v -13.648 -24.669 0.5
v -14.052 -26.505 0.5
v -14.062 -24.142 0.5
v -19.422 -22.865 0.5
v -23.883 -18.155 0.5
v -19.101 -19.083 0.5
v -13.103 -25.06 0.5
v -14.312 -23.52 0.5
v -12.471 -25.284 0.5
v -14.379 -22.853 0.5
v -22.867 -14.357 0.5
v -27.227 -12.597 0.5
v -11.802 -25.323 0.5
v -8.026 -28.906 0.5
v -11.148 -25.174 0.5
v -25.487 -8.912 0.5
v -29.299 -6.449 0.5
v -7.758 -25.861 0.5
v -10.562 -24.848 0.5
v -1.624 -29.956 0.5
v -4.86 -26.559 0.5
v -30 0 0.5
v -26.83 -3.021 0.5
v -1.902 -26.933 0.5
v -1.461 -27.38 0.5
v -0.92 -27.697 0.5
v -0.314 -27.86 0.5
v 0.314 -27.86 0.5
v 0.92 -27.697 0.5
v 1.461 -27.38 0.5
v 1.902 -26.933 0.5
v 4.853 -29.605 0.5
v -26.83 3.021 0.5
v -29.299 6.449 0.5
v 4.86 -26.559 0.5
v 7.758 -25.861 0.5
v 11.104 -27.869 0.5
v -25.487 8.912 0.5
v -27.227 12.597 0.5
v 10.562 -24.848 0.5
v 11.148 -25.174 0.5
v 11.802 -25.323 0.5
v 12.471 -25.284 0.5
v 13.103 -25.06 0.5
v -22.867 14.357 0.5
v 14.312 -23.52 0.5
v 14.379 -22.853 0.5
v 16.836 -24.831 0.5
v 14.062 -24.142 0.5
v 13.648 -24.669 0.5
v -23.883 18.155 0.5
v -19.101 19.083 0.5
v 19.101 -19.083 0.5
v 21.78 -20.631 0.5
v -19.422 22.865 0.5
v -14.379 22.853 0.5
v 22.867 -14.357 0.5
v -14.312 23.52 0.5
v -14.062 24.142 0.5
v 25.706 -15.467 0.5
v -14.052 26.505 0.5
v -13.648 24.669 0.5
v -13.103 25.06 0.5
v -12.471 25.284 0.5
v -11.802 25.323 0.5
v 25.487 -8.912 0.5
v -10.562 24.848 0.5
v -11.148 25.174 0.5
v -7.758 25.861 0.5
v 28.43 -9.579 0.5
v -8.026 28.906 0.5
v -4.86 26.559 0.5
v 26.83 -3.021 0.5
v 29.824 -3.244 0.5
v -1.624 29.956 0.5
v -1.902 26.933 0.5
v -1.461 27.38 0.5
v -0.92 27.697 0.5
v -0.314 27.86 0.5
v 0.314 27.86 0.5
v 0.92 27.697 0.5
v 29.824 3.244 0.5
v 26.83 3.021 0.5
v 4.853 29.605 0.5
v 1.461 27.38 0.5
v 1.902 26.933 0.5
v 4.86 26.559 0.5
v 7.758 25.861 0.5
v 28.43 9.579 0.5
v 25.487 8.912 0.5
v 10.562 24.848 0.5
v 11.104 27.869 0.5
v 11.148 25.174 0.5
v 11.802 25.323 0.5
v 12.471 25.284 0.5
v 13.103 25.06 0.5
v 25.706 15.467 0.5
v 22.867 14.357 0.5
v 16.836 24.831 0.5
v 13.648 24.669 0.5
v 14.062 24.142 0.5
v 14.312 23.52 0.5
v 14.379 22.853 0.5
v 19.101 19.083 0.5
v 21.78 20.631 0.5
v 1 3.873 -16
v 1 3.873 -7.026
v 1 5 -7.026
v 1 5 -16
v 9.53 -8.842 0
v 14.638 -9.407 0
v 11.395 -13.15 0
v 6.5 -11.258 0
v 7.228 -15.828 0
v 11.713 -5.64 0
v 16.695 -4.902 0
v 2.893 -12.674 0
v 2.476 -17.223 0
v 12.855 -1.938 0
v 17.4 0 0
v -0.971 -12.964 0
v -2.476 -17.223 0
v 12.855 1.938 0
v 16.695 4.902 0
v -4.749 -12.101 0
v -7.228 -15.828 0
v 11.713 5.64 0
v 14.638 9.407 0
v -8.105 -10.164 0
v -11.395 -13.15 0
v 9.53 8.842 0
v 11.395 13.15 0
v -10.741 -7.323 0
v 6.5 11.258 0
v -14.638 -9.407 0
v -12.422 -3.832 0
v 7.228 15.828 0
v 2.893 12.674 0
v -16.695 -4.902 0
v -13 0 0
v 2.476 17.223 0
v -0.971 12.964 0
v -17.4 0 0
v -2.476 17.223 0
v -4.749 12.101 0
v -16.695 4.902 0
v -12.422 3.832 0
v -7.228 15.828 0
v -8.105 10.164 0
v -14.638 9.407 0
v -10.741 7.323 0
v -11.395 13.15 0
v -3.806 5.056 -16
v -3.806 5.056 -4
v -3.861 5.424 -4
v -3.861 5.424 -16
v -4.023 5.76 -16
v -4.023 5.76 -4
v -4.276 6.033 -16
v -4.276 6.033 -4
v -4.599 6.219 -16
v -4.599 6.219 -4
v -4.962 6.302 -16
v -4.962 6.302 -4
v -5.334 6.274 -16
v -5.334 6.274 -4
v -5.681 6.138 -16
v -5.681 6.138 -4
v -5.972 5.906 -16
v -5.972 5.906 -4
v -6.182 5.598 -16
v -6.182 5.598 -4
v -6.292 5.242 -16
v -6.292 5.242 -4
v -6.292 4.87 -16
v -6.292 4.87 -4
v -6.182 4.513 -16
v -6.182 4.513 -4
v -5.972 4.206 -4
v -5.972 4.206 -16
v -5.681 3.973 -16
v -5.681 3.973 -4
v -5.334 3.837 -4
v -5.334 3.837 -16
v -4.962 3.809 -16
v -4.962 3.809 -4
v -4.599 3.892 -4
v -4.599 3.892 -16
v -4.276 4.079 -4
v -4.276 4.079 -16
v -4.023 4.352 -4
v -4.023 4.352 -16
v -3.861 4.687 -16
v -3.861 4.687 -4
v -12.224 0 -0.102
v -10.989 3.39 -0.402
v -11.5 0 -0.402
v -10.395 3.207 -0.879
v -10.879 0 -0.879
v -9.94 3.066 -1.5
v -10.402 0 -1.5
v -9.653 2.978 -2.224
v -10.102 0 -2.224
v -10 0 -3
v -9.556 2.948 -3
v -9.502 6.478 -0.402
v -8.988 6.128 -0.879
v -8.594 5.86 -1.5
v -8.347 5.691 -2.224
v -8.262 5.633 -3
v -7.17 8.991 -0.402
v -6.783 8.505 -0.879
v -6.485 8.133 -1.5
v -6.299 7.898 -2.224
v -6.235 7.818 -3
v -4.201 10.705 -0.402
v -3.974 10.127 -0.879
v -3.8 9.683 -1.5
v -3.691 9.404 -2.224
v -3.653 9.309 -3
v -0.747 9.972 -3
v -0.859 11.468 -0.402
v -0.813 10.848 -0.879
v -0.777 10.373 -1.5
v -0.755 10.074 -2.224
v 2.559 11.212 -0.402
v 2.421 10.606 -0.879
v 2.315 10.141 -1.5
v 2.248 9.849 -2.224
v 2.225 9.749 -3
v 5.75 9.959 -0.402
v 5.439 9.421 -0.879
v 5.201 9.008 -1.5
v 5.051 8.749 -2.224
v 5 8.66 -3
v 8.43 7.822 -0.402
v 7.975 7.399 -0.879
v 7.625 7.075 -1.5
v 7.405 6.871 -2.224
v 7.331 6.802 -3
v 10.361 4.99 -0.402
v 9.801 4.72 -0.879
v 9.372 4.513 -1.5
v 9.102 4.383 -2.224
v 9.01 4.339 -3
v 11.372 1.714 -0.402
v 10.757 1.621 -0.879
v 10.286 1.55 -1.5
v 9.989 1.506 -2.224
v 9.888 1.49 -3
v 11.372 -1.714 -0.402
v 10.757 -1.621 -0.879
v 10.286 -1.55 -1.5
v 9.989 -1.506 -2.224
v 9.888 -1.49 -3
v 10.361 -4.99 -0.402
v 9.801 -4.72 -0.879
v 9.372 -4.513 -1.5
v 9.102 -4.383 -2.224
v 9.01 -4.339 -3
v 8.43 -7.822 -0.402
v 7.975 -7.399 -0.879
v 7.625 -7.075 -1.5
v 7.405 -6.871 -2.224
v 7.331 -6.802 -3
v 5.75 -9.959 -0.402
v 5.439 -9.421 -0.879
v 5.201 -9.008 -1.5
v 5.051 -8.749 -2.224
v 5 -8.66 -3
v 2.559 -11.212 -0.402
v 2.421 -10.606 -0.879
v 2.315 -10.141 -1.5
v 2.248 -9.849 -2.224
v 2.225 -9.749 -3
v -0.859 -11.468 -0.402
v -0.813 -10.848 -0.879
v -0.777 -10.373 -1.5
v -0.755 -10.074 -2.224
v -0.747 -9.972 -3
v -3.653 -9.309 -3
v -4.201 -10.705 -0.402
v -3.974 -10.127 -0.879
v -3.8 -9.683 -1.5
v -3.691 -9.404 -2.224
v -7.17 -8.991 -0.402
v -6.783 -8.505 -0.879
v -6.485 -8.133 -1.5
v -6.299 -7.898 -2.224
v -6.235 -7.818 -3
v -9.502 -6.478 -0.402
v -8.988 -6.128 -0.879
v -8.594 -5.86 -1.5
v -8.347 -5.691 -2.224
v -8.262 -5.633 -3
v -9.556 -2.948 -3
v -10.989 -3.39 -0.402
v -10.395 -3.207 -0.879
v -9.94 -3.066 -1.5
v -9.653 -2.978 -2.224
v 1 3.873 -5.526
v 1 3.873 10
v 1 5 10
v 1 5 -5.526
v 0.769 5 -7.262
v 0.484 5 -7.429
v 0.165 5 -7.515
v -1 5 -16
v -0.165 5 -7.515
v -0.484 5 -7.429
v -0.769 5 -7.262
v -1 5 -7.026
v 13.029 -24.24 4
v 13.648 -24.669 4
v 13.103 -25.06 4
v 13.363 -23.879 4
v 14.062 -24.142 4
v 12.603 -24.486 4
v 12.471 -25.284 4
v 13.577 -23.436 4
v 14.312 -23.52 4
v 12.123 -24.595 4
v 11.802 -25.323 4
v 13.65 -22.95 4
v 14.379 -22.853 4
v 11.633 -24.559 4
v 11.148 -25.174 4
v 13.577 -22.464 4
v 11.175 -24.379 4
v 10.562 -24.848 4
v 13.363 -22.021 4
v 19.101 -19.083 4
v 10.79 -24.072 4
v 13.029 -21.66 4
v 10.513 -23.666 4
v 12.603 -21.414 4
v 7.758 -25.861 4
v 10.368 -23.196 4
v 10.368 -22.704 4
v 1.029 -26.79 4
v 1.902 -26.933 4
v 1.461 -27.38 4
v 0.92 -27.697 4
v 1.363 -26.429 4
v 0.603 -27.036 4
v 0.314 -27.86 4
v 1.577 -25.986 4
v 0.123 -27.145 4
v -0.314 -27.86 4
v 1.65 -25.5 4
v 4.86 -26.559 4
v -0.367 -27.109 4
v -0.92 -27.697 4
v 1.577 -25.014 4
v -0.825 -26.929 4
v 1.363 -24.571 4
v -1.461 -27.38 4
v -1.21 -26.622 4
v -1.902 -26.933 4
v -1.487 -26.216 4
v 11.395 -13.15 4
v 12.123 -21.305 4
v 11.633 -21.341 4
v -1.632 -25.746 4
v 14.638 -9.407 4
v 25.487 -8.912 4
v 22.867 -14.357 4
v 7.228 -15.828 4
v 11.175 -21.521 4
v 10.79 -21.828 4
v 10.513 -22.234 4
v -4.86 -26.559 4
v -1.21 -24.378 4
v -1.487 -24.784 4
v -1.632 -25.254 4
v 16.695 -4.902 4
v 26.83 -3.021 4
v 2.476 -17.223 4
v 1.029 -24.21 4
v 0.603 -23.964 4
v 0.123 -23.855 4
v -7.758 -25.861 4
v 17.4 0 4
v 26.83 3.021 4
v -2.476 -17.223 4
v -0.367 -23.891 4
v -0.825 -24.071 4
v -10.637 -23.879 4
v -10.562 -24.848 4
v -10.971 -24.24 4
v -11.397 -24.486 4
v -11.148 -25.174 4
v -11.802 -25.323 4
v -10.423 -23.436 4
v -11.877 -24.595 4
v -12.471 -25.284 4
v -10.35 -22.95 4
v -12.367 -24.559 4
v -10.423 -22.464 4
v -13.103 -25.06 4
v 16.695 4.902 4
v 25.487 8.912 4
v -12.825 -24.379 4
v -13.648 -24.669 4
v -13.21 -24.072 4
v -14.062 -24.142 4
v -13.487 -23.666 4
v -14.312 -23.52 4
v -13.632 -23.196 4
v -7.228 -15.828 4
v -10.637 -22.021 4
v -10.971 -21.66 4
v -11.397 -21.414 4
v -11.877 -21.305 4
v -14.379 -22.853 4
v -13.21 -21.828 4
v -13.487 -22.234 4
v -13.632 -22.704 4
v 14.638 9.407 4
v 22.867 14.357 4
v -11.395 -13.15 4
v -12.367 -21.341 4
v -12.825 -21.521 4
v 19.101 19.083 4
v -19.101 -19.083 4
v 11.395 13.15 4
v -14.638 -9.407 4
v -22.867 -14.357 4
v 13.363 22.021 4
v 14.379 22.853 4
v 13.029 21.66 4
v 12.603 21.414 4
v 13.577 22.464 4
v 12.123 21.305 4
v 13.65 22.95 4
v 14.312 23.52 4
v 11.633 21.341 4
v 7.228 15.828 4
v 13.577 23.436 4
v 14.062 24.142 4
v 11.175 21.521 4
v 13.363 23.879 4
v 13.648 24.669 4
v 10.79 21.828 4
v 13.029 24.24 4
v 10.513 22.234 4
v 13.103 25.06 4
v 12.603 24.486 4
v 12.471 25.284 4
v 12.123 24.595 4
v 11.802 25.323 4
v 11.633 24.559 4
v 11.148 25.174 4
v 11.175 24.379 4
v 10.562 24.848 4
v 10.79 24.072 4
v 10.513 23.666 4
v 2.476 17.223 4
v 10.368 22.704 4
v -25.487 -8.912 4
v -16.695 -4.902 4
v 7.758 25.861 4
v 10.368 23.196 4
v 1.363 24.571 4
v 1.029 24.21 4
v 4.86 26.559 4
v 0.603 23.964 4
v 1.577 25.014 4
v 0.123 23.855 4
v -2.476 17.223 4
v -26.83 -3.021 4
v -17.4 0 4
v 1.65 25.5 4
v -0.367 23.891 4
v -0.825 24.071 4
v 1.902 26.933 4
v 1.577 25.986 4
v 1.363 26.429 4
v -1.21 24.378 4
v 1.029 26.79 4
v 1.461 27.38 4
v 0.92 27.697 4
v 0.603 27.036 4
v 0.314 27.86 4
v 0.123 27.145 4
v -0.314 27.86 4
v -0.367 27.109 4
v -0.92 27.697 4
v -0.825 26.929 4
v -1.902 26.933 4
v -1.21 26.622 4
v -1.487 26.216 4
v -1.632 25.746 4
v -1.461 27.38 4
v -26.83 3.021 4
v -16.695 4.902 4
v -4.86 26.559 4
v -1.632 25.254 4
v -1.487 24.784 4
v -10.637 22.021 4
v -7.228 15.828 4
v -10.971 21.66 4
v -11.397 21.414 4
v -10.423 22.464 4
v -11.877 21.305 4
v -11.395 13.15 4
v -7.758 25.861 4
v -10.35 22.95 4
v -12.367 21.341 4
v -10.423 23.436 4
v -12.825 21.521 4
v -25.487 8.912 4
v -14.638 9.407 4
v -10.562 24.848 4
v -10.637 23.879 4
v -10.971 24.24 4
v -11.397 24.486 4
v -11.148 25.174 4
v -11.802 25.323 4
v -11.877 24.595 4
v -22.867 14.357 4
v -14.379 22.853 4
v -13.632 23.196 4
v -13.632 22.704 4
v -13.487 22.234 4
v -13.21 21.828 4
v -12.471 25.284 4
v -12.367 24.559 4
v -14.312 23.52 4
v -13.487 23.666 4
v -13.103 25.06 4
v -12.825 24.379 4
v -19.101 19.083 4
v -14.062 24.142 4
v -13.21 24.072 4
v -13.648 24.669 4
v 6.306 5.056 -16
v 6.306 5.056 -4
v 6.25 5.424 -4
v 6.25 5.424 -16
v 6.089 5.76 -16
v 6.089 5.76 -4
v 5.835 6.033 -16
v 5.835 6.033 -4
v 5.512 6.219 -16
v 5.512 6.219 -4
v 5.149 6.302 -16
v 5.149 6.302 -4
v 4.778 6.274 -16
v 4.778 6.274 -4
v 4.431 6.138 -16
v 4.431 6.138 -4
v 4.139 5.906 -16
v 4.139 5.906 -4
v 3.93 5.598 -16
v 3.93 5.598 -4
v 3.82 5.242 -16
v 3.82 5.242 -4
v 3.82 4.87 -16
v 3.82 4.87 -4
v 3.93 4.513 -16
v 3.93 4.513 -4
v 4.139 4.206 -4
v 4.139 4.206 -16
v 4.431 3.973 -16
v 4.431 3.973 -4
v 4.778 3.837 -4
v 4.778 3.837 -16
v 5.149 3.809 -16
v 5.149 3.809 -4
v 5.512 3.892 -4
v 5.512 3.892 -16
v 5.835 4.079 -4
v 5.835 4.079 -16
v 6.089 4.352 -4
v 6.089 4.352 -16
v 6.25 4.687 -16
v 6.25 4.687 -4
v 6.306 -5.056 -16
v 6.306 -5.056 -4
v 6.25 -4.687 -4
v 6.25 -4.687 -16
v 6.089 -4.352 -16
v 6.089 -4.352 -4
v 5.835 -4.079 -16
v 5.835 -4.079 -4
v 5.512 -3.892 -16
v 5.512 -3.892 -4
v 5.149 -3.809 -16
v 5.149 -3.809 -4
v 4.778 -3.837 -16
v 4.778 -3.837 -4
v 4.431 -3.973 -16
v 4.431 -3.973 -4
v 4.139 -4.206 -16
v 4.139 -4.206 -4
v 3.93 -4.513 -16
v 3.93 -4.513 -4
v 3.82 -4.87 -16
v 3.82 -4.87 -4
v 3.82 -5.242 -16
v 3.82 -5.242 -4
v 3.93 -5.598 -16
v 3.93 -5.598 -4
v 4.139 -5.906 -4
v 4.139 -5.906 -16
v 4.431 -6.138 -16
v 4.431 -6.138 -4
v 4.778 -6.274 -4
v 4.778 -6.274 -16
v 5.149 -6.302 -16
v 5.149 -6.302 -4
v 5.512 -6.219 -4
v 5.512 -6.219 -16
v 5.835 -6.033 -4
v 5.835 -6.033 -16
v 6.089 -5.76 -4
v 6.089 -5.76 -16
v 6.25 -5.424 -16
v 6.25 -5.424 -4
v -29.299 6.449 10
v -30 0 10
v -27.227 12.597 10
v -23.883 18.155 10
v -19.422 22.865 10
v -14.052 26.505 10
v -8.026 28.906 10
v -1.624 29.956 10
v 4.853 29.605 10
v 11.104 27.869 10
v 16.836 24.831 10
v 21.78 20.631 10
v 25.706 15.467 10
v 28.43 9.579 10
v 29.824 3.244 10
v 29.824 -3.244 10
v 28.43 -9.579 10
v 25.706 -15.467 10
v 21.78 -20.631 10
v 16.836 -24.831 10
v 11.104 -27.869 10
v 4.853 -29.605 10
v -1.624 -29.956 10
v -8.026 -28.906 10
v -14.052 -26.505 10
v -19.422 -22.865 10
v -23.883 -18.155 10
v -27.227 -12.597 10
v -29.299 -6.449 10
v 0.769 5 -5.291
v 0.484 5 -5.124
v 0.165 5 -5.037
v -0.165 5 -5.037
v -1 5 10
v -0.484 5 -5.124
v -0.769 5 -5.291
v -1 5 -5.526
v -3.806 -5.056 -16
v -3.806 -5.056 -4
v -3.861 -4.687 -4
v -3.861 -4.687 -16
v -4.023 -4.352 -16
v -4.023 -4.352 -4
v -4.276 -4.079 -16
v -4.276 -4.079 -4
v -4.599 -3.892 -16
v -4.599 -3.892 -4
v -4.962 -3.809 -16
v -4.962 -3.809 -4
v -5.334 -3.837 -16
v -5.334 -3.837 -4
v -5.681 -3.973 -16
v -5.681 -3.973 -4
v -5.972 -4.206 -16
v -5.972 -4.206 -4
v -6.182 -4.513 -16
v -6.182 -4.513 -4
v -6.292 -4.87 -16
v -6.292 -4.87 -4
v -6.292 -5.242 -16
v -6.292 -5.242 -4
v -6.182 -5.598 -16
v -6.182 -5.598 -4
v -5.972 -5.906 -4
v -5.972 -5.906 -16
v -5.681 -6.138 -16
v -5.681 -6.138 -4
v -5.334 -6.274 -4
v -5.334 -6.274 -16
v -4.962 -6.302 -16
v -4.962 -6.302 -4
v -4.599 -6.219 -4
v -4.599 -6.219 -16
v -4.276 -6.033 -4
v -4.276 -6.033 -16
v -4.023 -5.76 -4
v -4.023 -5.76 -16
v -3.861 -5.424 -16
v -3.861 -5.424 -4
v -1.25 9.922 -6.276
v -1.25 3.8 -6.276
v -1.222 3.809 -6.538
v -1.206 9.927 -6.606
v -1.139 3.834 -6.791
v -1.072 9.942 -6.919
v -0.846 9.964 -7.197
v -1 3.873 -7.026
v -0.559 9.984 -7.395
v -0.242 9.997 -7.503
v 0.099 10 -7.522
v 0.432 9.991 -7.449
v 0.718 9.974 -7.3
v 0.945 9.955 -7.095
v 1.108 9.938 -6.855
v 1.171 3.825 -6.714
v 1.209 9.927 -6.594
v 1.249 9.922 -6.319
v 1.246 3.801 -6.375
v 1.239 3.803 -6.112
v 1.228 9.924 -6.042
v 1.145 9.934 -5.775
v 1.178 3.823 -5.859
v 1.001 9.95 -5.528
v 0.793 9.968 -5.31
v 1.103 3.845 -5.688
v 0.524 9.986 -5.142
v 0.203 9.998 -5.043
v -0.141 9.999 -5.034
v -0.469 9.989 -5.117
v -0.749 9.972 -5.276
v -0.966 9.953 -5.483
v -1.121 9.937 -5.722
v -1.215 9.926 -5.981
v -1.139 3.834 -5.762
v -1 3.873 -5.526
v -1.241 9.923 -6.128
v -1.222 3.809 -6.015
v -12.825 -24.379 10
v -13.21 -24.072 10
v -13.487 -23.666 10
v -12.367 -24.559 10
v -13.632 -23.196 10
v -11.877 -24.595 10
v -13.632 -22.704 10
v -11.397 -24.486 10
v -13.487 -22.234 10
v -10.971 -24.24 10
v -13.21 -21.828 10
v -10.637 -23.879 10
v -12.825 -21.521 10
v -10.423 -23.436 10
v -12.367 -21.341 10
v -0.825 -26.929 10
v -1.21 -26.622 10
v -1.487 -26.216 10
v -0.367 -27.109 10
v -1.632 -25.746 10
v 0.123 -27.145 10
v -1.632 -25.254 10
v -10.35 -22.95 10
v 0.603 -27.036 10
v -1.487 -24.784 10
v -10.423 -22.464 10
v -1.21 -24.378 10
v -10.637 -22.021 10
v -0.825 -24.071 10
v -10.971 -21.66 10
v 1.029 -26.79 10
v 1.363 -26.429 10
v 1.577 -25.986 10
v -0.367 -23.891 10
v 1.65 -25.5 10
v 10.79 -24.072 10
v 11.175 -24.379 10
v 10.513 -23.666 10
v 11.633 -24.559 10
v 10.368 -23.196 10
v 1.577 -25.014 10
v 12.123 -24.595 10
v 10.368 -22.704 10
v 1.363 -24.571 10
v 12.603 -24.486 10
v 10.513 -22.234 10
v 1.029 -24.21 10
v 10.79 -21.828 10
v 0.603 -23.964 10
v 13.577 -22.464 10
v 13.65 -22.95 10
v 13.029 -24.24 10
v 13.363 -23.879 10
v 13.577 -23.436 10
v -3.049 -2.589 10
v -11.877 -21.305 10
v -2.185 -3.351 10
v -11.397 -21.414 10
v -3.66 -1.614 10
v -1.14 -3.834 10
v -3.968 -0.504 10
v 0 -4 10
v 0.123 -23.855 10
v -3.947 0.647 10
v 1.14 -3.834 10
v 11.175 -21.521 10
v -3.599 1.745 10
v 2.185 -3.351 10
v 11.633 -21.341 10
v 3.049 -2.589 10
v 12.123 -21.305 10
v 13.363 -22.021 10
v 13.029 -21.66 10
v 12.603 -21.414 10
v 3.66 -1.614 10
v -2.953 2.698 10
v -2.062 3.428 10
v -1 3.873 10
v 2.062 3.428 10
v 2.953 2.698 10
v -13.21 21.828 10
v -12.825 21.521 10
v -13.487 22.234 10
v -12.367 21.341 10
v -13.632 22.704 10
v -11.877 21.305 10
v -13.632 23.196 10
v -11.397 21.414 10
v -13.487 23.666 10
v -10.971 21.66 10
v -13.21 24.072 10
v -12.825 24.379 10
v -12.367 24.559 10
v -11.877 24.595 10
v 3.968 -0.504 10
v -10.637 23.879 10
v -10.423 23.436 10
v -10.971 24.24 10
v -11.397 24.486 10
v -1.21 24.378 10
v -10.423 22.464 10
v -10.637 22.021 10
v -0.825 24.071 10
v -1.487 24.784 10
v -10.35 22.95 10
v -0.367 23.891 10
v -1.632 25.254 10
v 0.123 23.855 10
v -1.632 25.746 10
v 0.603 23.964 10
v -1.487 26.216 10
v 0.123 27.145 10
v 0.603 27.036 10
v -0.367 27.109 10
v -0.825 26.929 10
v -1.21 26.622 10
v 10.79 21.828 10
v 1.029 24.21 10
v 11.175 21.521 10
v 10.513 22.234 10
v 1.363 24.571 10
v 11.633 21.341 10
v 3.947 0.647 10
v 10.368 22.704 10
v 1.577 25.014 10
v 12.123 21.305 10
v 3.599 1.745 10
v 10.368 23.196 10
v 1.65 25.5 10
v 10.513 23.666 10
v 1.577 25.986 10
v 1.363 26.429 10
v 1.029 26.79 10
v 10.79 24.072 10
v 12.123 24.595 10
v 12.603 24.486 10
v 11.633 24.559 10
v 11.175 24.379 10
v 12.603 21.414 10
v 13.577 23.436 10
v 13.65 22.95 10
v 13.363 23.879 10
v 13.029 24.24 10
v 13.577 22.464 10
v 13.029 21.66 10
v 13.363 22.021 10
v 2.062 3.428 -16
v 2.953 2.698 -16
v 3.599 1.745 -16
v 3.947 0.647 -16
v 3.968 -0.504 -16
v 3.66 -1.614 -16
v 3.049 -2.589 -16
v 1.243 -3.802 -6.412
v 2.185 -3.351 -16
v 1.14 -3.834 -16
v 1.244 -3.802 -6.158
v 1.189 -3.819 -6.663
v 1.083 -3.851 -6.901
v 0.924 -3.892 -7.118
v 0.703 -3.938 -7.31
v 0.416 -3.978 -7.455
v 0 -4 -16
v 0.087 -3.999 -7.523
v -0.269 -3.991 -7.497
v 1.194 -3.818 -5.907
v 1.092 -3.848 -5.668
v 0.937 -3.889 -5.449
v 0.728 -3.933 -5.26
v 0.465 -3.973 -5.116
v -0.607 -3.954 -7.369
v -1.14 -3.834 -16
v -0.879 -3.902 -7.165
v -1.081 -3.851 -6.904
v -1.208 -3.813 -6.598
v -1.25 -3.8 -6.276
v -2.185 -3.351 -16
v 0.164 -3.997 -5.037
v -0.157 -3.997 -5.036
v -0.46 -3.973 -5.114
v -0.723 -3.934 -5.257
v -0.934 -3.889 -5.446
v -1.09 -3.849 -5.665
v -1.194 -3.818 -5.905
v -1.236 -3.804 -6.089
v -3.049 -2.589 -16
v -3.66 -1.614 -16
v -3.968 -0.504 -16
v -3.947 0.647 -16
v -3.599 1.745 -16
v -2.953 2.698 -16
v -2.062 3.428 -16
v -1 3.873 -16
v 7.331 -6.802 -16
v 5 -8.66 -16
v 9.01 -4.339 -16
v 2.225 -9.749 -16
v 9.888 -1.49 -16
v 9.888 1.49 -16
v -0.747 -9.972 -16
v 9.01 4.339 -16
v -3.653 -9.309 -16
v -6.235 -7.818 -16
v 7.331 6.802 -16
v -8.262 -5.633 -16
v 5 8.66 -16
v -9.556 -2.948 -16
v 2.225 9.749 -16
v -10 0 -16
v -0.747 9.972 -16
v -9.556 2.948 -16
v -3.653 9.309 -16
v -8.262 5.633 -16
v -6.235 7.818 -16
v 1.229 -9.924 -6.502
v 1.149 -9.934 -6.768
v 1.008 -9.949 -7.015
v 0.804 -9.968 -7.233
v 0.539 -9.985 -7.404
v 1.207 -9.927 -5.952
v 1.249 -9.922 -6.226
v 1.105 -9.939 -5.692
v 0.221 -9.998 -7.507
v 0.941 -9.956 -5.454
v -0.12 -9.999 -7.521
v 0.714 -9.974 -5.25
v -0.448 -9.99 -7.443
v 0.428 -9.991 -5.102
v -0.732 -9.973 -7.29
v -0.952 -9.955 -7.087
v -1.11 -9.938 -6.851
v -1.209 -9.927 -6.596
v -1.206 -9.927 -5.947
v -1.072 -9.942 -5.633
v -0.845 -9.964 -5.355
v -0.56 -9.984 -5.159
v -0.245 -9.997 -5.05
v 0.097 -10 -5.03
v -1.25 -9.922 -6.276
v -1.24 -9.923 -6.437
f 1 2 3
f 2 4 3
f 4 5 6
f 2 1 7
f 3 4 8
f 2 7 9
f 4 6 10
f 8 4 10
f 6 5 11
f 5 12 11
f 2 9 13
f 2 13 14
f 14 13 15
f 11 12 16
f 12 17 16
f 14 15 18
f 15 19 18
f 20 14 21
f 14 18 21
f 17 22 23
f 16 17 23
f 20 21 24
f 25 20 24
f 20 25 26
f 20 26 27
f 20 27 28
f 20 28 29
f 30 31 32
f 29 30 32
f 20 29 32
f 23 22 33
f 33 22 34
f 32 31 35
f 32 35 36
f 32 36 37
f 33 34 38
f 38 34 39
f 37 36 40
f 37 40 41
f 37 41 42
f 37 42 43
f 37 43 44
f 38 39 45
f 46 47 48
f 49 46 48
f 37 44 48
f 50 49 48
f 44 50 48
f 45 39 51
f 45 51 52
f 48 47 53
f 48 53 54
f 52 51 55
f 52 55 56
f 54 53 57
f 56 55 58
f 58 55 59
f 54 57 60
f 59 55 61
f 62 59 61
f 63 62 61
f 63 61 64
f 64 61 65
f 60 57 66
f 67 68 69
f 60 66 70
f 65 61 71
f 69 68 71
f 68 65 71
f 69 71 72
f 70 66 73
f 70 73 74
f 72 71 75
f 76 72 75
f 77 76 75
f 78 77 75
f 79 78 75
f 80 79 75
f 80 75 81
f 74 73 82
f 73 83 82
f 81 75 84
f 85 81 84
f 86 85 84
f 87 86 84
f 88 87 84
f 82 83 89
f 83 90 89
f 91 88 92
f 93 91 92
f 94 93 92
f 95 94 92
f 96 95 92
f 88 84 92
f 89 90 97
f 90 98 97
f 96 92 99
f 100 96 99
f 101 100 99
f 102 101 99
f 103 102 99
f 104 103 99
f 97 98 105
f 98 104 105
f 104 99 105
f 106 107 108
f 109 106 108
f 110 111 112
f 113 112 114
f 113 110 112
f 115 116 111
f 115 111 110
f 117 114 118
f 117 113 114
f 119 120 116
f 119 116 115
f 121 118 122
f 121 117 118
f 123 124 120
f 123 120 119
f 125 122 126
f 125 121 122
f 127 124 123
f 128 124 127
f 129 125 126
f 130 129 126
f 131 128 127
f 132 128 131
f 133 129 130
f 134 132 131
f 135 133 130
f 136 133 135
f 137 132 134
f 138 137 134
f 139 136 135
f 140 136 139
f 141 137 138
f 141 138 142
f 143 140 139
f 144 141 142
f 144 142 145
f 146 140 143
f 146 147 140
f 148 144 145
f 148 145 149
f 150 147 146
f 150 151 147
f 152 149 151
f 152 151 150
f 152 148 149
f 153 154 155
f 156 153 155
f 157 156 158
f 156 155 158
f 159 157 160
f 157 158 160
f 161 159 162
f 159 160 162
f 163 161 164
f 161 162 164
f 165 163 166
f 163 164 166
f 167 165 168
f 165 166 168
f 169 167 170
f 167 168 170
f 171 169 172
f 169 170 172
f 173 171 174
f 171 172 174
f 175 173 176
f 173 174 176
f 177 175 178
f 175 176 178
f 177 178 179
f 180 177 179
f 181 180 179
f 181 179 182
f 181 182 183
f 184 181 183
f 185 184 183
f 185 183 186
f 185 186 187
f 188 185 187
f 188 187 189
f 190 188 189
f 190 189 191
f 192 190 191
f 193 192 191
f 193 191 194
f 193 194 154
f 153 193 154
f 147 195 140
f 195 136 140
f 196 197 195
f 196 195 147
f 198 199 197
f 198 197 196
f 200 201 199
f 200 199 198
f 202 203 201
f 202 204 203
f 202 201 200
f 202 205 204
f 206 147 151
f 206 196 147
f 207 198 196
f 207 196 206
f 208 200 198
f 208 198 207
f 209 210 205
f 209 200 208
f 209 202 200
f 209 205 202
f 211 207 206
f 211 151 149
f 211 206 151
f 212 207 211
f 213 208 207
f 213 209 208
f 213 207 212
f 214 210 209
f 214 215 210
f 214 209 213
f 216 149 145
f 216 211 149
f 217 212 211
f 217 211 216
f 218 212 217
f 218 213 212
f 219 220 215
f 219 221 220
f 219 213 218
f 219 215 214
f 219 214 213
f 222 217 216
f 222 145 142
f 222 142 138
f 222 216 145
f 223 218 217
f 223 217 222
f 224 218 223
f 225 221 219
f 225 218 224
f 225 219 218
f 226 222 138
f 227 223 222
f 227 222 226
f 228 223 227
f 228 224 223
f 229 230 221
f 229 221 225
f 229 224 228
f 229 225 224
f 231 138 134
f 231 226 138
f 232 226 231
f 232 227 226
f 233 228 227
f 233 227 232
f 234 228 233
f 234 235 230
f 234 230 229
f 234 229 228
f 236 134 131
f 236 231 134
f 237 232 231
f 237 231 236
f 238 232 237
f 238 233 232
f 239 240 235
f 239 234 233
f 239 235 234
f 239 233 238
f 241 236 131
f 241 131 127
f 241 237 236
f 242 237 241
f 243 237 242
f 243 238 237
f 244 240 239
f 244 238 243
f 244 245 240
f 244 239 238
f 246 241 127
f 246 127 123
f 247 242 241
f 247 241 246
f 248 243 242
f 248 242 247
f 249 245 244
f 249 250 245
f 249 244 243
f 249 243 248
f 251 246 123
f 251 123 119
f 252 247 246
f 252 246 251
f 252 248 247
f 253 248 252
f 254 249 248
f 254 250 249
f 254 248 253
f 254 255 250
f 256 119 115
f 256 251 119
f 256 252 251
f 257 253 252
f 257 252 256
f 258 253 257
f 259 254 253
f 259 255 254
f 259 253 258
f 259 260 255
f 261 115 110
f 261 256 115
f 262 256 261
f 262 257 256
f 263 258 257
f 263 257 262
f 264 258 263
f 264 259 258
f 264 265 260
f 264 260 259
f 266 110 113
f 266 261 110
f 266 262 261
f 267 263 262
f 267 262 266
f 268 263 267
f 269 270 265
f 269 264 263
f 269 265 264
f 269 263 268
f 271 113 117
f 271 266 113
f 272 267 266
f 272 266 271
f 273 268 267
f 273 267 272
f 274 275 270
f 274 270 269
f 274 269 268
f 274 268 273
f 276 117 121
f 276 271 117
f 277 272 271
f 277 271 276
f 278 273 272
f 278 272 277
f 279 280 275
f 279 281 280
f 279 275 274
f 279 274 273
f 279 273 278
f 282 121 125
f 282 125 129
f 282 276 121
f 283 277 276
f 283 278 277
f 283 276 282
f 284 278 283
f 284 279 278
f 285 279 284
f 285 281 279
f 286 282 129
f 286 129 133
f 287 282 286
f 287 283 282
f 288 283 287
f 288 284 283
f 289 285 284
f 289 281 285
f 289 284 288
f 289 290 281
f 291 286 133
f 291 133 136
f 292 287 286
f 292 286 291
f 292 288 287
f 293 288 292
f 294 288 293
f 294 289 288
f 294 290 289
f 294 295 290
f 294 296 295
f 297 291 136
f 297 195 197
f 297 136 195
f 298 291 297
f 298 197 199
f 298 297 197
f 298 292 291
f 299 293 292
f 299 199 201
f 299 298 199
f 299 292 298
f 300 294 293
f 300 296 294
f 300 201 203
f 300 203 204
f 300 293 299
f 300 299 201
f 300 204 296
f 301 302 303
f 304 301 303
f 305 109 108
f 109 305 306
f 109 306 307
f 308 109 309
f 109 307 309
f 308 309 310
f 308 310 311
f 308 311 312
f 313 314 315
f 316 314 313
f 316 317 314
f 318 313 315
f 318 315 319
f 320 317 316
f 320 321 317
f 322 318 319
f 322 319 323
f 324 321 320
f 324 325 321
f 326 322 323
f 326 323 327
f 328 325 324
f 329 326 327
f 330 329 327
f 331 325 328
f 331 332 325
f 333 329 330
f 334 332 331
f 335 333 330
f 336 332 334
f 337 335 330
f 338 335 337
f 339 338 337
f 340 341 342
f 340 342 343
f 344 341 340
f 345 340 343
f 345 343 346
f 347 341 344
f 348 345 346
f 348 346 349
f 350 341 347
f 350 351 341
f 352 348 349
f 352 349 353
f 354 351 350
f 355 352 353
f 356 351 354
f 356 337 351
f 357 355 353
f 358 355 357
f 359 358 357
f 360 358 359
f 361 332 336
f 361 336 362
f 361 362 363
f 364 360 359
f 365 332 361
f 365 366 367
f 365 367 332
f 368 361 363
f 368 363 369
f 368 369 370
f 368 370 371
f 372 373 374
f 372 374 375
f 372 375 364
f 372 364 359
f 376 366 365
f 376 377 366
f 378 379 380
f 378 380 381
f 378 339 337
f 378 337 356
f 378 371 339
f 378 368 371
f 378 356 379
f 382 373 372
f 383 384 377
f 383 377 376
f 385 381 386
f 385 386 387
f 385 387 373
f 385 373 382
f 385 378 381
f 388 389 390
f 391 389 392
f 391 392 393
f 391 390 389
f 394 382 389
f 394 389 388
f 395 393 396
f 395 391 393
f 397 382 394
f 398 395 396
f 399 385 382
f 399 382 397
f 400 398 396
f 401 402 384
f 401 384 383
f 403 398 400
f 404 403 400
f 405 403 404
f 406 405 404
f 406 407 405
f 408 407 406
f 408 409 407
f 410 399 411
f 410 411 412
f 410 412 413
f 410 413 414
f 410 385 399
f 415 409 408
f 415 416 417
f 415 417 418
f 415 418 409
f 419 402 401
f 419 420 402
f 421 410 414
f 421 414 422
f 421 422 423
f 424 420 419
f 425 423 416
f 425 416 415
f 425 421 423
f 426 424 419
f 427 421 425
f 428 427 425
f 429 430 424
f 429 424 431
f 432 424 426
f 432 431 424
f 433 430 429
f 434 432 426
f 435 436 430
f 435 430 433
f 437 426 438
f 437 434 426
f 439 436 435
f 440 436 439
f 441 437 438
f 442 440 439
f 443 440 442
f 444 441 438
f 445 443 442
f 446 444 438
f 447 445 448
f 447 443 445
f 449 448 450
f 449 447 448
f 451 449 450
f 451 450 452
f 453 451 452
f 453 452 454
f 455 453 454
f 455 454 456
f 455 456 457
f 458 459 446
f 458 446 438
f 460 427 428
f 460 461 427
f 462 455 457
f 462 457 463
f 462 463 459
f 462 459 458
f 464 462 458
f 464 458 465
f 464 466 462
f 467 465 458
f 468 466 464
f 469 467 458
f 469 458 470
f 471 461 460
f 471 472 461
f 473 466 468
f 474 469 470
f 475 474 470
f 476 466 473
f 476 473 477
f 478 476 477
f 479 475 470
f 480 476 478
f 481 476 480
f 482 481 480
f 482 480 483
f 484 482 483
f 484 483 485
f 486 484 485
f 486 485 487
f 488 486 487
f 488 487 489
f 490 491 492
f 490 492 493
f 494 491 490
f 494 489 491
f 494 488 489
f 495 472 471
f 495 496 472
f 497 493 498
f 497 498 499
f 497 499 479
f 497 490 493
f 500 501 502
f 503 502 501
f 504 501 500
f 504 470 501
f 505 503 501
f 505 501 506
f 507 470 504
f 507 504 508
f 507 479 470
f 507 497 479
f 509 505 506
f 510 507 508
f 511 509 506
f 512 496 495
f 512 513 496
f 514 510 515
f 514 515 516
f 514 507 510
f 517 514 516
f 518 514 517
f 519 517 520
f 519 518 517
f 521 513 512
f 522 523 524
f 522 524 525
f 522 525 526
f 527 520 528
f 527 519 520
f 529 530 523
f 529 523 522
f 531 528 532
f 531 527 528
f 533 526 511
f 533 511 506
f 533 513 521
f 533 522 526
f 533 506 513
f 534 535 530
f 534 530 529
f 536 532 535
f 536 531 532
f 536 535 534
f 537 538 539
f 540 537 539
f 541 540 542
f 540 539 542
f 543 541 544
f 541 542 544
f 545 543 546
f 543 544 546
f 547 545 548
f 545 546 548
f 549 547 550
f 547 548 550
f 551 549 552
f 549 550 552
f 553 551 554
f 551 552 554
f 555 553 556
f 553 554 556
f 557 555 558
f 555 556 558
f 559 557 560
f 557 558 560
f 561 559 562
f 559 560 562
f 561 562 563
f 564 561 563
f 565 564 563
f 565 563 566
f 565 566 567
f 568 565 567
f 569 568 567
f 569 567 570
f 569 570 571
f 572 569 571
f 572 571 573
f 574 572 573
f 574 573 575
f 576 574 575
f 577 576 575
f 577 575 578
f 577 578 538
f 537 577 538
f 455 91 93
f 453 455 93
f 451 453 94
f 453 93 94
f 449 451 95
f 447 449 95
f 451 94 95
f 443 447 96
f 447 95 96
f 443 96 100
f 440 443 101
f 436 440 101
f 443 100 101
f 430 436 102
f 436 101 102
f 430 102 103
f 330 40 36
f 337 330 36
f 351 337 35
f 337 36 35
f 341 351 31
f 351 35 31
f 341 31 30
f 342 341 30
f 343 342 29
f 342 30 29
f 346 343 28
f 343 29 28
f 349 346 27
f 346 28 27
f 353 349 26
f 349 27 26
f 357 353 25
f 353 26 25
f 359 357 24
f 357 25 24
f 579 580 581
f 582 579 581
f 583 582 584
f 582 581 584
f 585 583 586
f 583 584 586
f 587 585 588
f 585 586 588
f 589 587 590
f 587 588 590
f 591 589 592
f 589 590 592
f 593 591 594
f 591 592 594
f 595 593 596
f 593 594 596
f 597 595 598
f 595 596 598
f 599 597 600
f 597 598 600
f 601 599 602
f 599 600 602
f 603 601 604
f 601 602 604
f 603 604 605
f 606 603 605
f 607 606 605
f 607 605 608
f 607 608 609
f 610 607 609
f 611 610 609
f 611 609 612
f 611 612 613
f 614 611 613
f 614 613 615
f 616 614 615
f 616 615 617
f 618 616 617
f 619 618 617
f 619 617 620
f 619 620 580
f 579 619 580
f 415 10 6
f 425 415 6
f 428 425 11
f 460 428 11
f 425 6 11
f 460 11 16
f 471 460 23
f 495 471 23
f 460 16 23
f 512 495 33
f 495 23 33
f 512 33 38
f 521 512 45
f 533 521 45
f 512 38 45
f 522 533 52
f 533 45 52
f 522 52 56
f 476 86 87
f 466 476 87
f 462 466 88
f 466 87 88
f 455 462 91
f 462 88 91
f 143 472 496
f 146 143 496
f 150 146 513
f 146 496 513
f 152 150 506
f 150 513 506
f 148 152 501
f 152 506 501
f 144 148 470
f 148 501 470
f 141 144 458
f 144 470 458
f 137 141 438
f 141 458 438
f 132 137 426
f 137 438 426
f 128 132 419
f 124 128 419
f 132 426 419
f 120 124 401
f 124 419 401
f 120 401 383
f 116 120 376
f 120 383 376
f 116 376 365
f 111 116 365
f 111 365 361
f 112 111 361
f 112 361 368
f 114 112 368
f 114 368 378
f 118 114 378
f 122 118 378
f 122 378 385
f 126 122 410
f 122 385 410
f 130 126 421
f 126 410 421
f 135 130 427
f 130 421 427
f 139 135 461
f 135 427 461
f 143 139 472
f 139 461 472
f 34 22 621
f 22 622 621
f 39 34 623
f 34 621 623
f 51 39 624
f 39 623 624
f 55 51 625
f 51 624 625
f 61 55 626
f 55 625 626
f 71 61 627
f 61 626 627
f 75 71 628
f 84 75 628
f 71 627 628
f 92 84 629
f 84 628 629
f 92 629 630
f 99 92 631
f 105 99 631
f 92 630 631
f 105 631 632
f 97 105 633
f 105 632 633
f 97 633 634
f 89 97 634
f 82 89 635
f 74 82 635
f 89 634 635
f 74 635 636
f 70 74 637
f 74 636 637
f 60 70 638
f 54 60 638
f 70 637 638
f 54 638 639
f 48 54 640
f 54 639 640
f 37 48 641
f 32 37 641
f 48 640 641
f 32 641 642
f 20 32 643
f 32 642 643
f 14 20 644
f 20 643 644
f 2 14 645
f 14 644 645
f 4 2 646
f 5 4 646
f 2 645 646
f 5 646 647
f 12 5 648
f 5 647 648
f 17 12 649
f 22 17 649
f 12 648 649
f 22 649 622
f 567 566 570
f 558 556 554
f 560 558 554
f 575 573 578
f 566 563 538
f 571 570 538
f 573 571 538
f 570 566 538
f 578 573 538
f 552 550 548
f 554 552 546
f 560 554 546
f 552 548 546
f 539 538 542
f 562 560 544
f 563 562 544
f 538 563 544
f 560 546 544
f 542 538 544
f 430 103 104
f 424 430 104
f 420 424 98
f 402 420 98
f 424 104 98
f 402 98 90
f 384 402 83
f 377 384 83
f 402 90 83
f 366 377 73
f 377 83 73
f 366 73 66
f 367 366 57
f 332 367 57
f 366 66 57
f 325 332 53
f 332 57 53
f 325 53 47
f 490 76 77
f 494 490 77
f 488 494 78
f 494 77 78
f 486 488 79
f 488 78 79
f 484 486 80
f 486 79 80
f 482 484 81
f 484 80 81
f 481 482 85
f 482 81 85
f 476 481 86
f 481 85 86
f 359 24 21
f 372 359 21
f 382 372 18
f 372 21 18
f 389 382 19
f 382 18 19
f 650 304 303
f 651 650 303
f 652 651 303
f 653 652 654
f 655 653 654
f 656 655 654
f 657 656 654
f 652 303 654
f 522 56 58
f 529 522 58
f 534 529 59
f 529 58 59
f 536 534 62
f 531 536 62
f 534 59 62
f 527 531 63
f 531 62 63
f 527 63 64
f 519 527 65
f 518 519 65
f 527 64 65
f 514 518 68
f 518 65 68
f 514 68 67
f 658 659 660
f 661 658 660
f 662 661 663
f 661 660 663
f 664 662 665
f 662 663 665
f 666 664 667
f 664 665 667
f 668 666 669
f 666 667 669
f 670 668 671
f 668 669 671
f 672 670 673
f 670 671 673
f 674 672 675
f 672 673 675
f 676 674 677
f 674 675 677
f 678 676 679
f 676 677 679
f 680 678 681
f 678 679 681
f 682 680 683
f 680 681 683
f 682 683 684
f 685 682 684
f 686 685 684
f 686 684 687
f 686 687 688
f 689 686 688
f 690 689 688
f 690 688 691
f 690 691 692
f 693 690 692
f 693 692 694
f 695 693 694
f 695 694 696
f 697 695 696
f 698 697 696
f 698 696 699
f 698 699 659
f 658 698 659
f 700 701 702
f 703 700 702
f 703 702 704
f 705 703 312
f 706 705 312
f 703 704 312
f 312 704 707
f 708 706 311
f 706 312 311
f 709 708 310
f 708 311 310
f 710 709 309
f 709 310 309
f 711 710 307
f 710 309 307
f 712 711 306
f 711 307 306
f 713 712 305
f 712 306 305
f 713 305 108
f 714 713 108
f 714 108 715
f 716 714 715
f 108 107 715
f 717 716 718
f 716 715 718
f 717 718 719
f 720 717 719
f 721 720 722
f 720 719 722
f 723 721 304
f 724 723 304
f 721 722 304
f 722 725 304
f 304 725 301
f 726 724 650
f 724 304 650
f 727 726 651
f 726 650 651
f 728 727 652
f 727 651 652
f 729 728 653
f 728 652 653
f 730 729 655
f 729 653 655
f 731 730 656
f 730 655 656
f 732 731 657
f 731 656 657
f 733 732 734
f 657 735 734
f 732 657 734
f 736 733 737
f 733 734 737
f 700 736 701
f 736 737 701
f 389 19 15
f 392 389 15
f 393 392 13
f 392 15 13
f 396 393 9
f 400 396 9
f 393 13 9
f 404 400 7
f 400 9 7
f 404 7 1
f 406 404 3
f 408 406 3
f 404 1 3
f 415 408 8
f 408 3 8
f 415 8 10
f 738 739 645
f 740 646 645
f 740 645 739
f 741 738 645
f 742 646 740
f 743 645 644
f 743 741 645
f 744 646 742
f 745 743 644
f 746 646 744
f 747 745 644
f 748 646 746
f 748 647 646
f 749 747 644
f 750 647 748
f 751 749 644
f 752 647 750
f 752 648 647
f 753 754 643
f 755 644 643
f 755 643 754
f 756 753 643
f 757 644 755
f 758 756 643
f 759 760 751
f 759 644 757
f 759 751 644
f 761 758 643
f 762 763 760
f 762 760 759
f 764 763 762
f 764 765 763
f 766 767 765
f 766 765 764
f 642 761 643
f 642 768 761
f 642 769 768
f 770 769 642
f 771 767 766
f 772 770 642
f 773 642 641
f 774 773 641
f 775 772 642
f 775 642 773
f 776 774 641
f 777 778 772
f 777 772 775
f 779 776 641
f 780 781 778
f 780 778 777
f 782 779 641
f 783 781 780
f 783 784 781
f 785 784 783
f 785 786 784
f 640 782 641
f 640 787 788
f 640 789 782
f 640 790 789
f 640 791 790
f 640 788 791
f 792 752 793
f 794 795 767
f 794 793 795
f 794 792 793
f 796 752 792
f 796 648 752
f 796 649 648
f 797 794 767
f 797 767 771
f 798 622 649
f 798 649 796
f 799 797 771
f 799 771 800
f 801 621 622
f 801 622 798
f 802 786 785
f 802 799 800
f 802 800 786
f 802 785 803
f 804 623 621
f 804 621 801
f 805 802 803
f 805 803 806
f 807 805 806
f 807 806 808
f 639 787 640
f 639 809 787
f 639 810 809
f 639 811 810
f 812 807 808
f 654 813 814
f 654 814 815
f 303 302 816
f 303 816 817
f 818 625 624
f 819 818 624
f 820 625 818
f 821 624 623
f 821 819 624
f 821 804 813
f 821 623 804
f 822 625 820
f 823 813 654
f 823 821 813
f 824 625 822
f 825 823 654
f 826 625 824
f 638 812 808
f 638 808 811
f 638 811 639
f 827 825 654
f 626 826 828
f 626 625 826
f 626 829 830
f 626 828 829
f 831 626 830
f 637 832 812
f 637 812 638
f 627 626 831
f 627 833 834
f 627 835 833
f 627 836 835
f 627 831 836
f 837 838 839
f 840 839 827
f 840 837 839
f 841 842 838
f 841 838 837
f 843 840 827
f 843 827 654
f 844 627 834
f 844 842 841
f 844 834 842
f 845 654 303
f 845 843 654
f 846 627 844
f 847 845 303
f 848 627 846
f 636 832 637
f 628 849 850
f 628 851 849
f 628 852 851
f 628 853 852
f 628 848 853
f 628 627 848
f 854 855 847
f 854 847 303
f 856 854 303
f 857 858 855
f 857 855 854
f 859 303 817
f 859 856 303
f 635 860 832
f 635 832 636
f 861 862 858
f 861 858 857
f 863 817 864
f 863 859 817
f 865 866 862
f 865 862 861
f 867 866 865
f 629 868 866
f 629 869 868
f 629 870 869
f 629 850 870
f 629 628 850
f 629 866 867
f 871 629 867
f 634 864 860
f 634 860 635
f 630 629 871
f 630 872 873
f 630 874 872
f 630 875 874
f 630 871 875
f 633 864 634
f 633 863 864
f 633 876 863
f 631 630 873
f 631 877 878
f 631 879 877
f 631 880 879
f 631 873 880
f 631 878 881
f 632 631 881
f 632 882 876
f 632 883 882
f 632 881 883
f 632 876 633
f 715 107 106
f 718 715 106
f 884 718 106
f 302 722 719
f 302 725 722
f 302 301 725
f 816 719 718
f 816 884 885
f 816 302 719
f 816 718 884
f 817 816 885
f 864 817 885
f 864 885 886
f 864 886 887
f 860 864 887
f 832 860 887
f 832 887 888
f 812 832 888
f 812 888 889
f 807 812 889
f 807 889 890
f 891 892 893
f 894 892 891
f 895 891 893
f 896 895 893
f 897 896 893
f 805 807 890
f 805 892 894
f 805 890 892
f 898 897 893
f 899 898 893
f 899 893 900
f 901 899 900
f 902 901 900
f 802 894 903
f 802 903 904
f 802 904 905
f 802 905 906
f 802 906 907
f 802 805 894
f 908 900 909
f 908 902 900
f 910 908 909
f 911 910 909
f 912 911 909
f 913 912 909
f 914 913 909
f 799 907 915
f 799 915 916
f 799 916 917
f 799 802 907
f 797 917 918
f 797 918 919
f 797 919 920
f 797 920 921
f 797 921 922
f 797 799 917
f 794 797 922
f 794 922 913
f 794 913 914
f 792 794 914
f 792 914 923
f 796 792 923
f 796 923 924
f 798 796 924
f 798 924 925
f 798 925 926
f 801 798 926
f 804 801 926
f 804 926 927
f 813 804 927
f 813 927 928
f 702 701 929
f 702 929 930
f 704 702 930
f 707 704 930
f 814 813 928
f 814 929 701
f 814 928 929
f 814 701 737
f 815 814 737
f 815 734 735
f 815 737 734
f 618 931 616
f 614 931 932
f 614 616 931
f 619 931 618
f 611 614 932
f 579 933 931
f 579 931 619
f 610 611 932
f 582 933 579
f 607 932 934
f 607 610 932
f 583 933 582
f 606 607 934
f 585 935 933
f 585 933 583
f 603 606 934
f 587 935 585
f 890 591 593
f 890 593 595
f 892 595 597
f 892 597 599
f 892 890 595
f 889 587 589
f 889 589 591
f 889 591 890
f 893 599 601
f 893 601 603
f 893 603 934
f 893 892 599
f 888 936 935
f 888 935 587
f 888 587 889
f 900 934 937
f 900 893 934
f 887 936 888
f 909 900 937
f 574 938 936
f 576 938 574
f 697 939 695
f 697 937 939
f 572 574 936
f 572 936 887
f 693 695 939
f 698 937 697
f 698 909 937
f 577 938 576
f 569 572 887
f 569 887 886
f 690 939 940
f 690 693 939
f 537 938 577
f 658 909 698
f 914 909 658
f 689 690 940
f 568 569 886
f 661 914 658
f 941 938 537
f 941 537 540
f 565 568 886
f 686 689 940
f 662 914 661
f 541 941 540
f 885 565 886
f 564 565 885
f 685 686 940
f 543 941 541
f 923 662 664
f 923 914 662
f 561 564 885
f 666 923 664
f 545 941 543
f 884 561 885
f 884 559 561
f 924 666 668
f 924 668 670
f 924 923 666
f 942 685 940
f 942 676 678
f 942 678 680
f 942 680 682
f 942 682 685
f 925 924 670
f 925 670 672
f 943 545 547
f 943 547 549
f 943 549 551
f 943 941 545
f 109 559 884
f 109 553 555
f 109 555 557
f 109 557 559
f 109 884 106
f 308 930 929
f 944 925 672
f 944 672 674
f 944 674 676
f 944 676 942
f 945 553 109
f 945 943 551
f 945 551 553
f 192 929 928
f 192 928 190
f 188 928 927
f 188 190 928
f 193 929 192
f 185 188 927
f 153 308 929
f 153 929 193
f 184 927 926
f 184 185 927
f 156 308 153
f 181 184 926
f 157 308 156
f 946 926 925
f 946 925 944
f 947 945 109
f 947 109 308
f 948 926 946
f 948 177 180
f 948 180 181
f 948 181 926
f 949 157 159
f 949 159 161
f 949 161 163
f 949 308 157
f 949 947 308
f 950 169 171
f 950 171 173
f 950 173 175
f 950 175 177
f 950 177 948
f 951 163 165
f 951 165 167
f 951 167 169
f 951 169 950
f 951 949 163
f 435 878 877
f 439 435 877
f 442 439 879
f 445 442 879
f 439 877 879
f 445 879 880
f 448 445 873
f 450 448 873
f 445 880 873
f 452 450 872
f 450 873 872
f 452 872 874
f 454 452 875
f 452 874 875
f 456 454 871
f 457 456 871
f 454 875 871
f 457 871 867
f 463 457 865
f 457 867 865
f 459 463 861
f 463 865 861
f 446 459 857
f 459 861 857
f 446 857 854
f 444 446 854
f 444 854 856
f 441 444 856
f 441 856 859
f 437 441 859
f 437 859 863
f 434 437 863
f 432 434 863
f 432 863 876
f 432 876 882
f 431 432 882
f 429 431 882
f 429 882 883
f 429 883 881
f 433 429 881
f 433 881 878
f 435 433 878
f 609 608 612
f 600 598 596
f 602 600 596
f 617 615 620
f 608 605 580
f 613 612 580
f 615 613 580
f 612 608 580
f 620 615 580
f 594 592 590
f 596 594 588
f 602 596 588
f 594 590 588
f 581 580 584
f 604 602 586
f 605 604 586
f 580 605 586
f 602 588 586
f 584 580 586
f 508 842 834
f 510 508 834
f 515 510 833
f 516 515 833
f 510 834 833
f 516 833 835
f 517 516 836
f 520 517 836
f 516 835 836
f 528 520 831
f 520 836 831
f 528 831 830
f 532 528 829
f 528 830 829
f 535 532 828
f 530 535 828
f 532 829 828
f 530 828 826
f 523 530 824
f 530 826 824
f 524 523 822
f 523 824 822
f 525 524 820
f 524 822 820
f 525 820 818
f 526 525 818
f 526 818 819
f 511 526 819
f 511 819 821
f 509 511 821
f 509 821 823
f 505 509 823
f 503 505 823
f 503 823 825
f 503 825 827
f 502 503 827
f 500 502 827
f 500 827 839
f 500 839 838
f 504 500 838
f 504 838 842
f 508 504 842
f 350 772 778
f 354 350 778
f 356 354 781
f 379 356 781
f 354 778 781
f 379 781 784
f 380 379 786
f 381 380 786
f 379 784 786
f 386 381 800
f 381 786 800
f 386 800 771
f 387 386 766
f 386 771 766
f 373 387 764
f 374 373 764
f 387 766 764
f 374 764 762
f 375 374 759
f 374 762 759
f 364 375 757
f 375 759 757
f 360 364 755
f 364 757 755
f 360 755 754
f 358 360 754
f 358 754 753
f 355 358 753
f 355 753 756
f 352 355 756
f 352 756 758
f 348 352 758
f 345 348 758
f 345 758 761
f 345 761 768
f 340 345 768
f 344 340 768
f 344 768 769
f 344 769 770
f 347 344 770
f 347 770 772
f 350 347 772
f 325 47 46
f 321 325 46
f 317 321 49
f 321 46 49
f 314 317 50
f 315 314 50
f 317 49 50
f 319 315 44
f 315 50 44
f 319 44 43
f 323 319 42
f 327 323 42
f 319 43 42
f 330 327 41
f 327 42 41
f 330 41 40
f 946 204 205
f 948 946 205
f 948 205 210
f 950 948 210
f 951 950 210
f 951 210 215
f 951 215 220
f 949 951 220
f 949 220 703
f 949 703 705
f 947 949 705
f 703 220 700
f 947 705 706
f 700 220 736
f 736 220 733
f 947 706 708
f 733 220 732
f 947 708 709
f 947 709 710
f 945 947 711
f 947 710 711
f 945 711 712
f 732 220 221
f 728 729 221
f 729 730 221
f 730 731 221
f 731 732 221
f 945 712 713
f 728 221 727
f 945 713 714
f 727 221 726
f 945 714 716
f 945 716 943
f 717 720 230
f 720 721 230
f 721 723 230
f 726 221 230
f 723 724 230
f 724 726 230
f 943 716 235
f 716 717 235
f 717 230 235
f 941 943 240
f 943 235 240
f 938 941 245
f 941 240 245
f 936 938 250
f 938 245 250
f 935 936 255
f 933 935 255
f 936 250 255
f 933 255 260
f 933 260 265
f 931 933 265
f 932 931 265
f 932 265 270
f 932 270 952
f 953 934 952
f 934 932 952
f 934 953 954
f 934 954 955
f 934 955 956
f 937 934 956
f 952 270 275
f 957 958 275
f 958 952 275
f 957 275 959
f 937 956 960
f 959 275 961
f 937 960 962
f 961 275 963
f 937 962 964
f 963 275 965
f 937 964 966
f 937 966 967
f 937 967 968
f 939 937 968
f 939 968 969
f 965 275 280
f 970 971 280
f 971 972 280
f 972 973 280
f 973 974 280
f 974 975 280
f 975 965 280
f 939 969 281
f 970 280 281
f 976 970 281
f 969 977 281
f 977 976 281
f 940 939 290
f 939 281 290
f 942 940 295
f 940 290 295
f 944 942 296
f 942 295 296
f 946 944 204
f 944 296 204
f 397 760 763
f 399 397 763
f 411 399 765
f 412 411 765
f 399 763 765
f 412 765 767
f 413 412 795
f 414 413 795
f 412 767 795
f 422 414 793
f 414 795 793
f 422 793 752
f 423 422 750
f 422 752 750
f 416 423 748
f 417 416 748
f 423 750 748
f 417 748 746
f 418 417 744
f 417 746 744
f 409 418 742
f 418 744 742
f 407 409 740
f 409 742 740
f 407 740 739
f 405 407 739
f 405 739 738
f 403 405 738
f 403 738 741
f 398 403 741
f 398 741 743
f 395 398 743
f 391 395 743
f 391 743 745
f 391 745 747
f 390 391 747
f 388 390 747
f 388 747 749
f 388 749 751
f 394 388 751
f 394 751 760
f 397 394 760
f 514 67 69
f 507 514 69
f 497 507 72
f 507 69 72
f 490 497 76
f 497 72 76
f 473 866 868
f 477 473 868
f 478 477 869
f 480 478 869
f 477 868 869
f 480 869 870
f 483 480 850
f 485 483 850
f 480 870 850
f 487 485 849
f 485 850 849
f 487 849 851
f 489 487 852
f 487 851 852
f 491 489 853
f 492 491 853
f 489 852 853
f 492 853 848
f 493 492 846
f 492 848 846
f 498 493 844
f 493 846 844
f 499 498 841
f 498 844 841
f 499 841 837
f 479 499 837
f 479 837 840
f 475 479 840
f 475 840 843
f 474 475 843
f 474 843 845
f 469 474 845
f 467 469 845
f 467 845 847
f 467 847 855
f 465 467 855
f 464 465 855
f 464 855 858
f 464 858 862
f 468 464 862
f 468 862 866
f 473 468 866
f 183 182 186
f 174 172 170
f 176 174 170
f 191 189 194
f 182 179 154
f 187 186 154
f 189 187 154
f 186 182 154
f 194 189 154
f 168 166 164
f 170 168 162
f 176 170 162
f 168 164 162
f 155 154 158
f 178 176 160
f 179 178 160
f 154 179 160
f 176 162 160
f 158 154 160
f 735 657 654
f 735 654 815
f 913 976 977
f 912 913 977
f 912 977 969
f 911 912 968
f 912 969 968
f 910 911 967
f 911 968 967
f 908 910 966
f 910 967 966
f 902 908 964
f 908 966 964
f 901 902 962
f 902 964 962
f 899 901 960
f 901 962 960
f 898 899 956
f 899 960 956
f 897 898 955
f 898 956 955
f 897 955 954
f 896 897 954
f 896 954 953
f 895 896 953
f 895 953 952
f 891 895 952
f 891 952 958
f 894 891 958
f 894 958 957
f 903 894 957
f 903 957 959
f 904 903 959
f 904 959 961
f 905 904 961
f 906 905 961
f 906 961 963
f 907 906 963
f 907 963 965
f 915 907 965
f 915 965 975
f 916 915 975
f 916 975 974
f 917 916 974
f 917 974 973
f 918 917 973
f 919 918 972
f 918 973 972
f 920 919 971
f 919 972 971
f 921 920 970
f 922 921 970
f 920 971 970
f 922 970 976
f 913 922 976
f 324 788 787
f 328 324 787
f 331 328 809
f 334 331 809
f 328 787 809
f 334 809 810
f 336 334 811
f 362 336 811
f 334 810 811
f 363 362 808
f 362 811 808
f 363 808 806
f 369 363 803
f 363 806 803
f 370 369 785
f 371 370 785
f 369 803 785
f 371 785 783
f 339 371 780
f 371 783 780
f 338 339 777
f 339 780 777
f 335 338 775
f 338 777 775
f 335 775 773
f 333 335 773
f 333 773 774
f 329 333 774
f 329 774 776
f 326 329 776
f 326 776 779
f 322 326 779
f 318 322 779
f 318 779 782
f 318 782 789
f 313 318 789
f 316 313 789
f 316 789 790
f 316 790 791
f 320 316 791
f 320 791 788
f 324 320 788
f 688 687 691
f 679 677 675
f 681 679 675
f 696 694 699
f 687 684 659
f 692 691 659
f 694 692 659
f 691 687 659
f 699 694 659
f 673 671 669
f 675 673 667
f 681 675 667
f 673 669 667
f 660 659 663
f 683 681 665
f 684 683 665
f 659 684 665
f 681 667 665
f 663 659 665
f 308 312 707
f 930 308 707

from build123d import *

# Parameters (mm, degrees)
SKETCH1_W                  = 30
SKETCH1_H                  = 9.5
CUT_EXTRUDE1_DEPTH         = 3.5
SKETCH3_R                  = 17.4
BOSS_EXTRUDE1_DEPTH        = 4
SKETCH4_R                  = 10
BOSS_EXTRUDE2_DEPTH        = 16
CUT_EXTRUDE2_DEPTH         = 50.759421218
SKETCH6_W                  = 4
SKETCH6_H                  = 26
F_4_CLEARANCE_HOLE1_D      = 3.3
F_2_CLEARANCE_HOLE1_D      = 2.5
F_2_CLEARANCE_HOLE1_DEPTH  = 12
F_2_CLEARANCE_HOLE2_REACH  = 54.582
F_2_CLEARANCE_HOLE2_BORE_R = 1.25
F_2_CLEARANCE_HOLE3_D      = 2.5
F_2_CLEARANCE_HOLE3_DEPTH  = 40
FILLET1_R                  = 3


with BuildPart() as part:
    # Sketch1 → Revolve1 (revolve)
    with BuildSketch(Plane.XZ, mode=Mode.PRIVATE) as revolve1_sk:
        with Locations((15, 5.25)):
            Rectangle(SKETCH1_W, SKETCH1_H)
    revolve(revolve1_sk.sketch.rotate(Axis((0, 0, 10), (0, 0, -1)), 180), axis=Axis((0, 0, 10), (0, 0, -1)))

    # Sketch2 → Cut-Extrude1 (cut)
    with BuildSketch(Plane(origin=(0, 0, 0.5), x_dir=(-1, 0, 0), z_dir=(0, 0, -1))):
        with BuildLine():
            ThreePointArc((1.901854596, -26.932934283), (6.318658968, -26.250229501), (10.562335147, -24.848281153))
            ThreePointArc((10.562335147, -24.848281153), (13.103370267, -25.060195635), (14.379253383, -22.852506912))
            ThreePointArc((14.379253383, -22.852506912), (27, 0), (14.379253383, 22.852506912))
            ThreePointArc((14.379253383, 22.852506912), (13.103370267, 25.060195635), (10.562335147, 24.848281153))
            ThreePointArc((10.562335147, 24.848281153), (6.318658968, 26.250229501), (1.901854596, 26.932934283))
            ThreePointArc((1.901854596, 26.932934283), (0, 27.88125), (-1.901854596, 26.932934283))
            ThreePointArc((-1.901854596, 26.932934283), (-6.318658968, 26.250229501), (-10.562335147, 24.848281153))
            ThreePointArc((-10.562335147, 24.848281153), (-13.103370267, 25.060195635), (-14.379253383, 22.852506912))
            ThreePointArc((-14.379253383, 22.852506912), (-27, 0), (-14.379253383, -22.852506912))
            ThreePointArc((-14.379253383, -22.852506912), (-13.103370267, -25.060195635), (-10.562335147, -24.848281153))
            ThreePointArc((-10.562335147, -24.848281153), (-6.318658968, -26.250229501), (-1.901854596, -26.932934283))
            ThreePointArc((-1.901854596, -26.932934283), (0, -27.88125), (1.901854596, -26.932934283))
        make_face()
    extrude(amount=-CUT_EXTRUDE1_DEPTH, mode=Mode.SUBTRACT)

    # Sketch3 → Boss-Extrude1 (add)
    with BuildSketch(Plane(origin=(0, 0, 4), x_dir=(-1, 0, 0), z_dir=(0, 0, -1))):
        Circle(SKETCH3_R)
    extrude(amount=BOSS_EXTRUDE1_DEPTH)

    # Sketch4 → Boss-Extrude2 (add)
    with BuildSketch(Plane(origin=(0, 0, 0), x_dir=(-1, 0, 0), z_dir=(0, 0, -1))):
        Circle(SKETCH4_R)
    extrude(amount=BOSS_EXTRUDE2_DEPTH)

    # Sketch5 → Cut-Extrude2 (cut, through all)
    with BuildSketch(Plane.XY.offset(10)):
        with BuildLine():
            Line((1, 5), (-1, 5))
            Line((-1, 5), (-1, 3.872983346))
            ThreePointArc((-1, 3.872983346), (0, 4), (1, 3.872983346))
            Line((1, 3.872983346), (1, 5))
        make_face()
    extrude(amount=-CUT_EXTRUDE2_DEPTH, mode=Mode.SUBTRACT)

    # Sketch6 → Cut-Revolve1 (revolve, cut)
    with BuildSketch(Plane.XZ):
        with Locations((2, -3)):
            Rectangle(SKETCH6_W, SKETCH6_H)
    revolve(axis=Axis((0, 0, 10), (0, 0, -1)), mode=Mode.SUBTRACT)

    # #4 Clearance Hole1 (through all)
    with Locations(Plane(origin=(0, 0, 4), x_dir=(-1, 0, 0), z_dir=(0, 0, -1))):
        with Locations((12, -22.95), (0, -25.5), (-12, -22.95), (-12, 22.95), (0, 25.5), (12, 22.95)):
            Hole(F_4_CLEARANCE_HOLE1_D / 2)

    # #2 Clearance Hole1
    with Locations(Plane(origin=(0, 0, -16), x_dir=(-1, 0, 0), z_dir=(0, 0, -1))):
        with Locations((-5.055813485, -5.055813485), (5.055813485, -5.055813485), (5.055813485, 5.055813485), (-5.055813485, 5.055813485)):
            Hole(F_2_CLEARANCE_HOLE1_D / 2, depth=F_2_CLEARANCE_HOLE1_DEPTH)

    # #2 Clearance Hole2 bore (on position points) → #2 Clearance Hole2 (cut, up to next)
    with BuildSketch(Plane(origin=(0, -10, -6.276306458), x_dir=(-1, 0, 0), z_dir=(0, -1, 0)), mode=Mode.PRIVATE) as f_2_clearance_hole2_sk1:
        Circle(F_2_CLEARANCE_HOLE2_BORE_R)
    f_2_clearance_hole2_tool1 = extrude(f_2_clearance_hole2_sk1.sketch, amount=-F_2_CLEARANCE_HOLE2_REACH, mode=Mode.PRIVATE) & part.part
    add(f_2_clearance_hole2_tool1.solids().sort_by_distance((0, -10, -6.276306))[0], mode=Mode.SUBTRACT)

    # #2 Clearance Hole3
    with Locations(Plane(origin=(0, 10, -6.276306458), x_dir=(1, 0, 0), z_dir=(0, 1, 0))):
        with Locations((0, 0)):
            Hole(F_2_CLEARANCE_HOLE3_D / 2, depth=F_2_CLEARANCE_HOLE3_DEPTH)

    # Fillet1
    fillet1_edges = [part.edges().sort_by_distance(p)[0] for p in [
        (10, 0, 0),
    ]]
    fillet(fillet1_edges, radius=FILLET1_R)


solid = part.part
